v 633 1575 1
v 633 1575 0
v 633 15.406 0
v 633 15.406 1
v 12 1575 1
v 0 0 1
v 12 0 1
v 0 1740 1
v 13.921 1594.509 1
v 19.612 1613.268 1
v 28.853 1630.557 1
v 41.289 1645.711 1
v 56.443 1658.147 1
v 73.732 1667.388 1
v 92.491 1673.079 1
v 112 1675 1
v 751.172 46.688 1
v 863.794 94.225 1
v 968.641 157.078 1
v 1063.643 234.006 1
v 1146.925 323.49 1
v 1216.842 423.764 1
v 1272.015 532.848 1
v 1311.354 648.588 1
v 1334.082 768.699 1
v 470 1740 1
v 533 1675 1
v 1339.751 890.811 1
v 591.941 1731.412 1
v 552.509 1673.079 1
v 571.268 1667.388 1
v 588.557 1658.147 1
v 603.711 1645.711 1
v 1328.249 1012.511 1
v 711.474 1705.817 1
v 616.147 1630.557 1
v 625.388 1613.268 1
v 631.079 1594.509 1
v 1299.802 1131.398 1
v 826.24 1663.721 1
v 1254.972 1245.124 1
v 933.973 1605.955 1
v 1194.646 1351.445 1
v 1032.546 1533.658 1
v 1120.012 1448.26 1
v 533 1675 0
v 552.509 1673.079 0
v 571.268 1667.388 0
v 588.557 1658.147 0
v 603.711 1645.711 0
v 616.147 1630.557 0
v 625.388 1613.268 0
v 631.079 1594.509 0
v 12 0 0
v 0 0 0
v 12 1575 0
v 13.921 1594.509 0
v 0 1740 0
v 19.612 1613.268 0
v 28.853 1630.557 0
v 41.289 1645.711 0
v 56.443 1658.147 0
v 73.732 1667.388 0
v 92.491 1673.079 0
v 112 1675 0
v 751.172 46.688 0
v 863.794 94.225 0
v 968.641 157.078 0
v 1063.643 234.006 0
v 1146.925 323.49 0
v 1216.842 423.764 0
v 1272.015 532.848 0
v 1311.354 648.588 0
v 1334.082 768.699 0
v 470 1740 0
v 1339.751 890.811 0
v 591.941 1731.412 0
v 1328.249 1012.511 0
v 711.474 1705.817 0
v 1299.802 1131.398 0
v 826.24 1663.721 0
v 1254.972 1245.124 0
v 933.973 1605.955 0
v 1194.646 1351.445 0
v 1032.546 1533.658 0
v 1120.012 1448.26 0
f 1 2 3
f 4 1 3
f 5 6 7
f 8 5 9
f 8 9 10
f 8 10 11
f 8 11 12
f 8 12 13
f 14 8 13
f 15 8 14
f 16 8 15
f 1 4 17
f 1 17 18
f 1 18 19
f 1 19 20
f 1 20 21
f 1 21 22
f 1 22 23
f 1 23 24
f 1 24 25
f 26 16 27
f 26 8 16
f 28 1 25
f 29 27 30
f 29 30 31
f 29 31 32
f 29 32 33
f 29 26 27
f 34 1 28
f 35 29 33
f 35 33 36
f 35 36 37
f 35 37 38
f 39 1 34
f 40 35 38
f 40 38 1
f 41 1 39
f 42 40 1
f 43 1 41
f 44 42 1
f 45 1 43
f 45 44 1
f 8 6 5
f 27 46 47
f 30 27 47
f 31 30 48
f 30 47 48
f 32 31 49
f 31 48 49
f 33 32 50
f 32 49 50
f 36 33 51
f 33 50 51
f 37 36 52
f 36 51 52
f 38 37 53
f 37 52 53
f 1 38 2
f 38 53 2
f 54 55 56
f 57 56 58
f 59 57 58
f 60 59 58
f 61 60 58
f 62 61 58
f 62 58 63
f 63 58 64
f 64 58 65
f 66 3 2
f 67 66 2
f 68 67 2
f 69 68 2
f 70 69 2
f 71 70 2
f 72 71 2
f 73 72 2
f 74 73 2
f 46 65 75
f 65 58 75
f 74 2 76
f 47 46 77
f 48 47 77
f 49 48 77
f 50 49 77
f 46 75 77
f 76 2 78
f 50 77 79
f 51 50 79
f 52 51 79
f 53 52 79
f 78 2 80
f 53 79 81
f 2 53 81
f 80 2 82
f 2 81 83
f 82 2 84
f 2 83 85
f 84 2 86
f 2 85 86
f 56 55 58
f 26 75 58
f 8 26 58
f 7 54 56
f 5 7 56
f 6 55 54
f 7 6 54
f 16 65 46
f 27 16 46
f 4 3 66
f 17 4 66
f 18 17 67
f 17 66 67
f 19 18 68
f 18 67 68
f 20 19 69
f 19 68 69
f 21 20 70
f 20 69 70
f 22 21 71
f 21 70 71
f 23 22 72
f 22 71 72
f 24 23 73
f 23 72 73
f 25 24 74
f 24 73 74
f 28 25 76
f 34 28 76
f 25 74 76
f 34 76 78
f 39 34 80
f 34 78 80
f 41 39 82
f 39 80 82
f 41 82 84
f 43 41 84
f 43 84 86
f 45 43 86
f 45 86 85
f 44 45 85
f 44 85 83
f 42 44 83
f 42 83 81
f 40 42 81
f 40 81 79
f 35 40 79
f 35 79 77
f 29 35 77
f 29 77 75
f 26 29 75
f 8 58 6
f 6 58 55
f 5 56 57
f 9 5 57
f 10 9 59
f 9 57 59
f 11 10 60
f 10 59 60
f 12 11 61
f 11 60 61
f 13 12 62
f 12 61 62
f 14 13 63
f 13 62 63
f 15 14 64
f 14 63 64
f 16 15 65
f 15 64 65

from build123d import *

# Parameters (mm, degrees)
BOSS_EXTRUDE1_DEPTH = 1
CUT_EXTRUDE2_DEPTH  = 330


with BuildPart() as part:
    # Sketch1 → Boss-Extrude1 (new body)
    with BuildSketch(Plane.XY):
        with BuildLine():
            Line((0, 0), (470, 0))
            ThreePointArc((470, 0), (1340, 870), (470, 1740))
            Line((470, 1740), (0, 1740))
            Line((0, 1740), (0, 0))
        make_face()
    extrude(amount=BOSS_EXTRUDE1_DEPTH)

    # Sketch3 → Cut-Extrude2 (cut)
    with BuildSketch(Plane(origin=(-1354.112118138, -994.457487155, -32), x_dir=(-1, 0, 0), z_dir=(0, 0, -1))):
        with BuildLine():
            Line((-1887.112118138, 819.457487155), (-1466.112118138, 819.457487155))
            ThreePointArc((-1466.112118138, 819.457487155), (-1395.40144002, 848.746809036), (-1366.112118138, 919.457487155))
            Line((-1366.112118138, 919.457487155), (-1366.112118138, 2569.457487155))
            ThreePointArc((-1366.112118138, 2569.457487155), (-1395.40144002, 2640.168165273), (-1466.112118138, 2669.457487155))
            Line((-1466.112118138, 2669.457487155), (-1887.112118138, 2669.457487155))
            ThreePointArc((-1887.112118138, 2669.457487155), (-1957.822796257, 2640.168165273), (-1987.112118138, 2569.457487155))
            Line((-1987.112118138, 2569.457487155), (-1987.112118138, 919.457487155))
            ThreePointArc((-1987.112118138, 919.457487155), (-1957.822796257, 848.746809036), (-1887.112118138, 819.457487155))
        make_face()
    extrude(amount=-CUT_EXTRUDE2_DEPTH, mode=Mode.SUBTRACT)


solid = part.part
